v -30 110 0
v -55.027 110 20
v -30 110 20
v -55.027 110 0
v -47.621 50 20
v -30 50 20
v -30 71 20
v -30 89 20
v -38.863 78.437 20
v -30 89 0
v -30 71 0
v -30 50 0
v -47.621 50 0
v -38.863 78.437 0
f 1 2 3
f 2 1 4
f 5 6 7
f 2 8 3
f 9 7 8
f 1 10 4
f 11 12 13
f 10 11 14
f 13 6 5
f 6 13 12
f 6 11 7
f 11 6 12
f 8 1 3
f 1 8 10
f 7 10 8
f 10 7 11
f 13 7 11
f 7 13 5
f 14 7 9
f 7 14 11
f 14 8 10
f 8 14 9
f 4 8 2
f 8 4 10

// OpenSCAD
translate([-30,50,0])
scale([3,3,1])
rotate([0,0,+90]) {
    difference() {
        cube([20, 20, 20]);
        translate([7, 0, -1]) {
            rotate([0,0,50]) {
                cube([30, 30, 30]);
            }
        }
        translate([13, 0, -1]) {
            rotate([0,0,50]) {
                cube([30, 30, 30]);
            }
        }
    }
}
